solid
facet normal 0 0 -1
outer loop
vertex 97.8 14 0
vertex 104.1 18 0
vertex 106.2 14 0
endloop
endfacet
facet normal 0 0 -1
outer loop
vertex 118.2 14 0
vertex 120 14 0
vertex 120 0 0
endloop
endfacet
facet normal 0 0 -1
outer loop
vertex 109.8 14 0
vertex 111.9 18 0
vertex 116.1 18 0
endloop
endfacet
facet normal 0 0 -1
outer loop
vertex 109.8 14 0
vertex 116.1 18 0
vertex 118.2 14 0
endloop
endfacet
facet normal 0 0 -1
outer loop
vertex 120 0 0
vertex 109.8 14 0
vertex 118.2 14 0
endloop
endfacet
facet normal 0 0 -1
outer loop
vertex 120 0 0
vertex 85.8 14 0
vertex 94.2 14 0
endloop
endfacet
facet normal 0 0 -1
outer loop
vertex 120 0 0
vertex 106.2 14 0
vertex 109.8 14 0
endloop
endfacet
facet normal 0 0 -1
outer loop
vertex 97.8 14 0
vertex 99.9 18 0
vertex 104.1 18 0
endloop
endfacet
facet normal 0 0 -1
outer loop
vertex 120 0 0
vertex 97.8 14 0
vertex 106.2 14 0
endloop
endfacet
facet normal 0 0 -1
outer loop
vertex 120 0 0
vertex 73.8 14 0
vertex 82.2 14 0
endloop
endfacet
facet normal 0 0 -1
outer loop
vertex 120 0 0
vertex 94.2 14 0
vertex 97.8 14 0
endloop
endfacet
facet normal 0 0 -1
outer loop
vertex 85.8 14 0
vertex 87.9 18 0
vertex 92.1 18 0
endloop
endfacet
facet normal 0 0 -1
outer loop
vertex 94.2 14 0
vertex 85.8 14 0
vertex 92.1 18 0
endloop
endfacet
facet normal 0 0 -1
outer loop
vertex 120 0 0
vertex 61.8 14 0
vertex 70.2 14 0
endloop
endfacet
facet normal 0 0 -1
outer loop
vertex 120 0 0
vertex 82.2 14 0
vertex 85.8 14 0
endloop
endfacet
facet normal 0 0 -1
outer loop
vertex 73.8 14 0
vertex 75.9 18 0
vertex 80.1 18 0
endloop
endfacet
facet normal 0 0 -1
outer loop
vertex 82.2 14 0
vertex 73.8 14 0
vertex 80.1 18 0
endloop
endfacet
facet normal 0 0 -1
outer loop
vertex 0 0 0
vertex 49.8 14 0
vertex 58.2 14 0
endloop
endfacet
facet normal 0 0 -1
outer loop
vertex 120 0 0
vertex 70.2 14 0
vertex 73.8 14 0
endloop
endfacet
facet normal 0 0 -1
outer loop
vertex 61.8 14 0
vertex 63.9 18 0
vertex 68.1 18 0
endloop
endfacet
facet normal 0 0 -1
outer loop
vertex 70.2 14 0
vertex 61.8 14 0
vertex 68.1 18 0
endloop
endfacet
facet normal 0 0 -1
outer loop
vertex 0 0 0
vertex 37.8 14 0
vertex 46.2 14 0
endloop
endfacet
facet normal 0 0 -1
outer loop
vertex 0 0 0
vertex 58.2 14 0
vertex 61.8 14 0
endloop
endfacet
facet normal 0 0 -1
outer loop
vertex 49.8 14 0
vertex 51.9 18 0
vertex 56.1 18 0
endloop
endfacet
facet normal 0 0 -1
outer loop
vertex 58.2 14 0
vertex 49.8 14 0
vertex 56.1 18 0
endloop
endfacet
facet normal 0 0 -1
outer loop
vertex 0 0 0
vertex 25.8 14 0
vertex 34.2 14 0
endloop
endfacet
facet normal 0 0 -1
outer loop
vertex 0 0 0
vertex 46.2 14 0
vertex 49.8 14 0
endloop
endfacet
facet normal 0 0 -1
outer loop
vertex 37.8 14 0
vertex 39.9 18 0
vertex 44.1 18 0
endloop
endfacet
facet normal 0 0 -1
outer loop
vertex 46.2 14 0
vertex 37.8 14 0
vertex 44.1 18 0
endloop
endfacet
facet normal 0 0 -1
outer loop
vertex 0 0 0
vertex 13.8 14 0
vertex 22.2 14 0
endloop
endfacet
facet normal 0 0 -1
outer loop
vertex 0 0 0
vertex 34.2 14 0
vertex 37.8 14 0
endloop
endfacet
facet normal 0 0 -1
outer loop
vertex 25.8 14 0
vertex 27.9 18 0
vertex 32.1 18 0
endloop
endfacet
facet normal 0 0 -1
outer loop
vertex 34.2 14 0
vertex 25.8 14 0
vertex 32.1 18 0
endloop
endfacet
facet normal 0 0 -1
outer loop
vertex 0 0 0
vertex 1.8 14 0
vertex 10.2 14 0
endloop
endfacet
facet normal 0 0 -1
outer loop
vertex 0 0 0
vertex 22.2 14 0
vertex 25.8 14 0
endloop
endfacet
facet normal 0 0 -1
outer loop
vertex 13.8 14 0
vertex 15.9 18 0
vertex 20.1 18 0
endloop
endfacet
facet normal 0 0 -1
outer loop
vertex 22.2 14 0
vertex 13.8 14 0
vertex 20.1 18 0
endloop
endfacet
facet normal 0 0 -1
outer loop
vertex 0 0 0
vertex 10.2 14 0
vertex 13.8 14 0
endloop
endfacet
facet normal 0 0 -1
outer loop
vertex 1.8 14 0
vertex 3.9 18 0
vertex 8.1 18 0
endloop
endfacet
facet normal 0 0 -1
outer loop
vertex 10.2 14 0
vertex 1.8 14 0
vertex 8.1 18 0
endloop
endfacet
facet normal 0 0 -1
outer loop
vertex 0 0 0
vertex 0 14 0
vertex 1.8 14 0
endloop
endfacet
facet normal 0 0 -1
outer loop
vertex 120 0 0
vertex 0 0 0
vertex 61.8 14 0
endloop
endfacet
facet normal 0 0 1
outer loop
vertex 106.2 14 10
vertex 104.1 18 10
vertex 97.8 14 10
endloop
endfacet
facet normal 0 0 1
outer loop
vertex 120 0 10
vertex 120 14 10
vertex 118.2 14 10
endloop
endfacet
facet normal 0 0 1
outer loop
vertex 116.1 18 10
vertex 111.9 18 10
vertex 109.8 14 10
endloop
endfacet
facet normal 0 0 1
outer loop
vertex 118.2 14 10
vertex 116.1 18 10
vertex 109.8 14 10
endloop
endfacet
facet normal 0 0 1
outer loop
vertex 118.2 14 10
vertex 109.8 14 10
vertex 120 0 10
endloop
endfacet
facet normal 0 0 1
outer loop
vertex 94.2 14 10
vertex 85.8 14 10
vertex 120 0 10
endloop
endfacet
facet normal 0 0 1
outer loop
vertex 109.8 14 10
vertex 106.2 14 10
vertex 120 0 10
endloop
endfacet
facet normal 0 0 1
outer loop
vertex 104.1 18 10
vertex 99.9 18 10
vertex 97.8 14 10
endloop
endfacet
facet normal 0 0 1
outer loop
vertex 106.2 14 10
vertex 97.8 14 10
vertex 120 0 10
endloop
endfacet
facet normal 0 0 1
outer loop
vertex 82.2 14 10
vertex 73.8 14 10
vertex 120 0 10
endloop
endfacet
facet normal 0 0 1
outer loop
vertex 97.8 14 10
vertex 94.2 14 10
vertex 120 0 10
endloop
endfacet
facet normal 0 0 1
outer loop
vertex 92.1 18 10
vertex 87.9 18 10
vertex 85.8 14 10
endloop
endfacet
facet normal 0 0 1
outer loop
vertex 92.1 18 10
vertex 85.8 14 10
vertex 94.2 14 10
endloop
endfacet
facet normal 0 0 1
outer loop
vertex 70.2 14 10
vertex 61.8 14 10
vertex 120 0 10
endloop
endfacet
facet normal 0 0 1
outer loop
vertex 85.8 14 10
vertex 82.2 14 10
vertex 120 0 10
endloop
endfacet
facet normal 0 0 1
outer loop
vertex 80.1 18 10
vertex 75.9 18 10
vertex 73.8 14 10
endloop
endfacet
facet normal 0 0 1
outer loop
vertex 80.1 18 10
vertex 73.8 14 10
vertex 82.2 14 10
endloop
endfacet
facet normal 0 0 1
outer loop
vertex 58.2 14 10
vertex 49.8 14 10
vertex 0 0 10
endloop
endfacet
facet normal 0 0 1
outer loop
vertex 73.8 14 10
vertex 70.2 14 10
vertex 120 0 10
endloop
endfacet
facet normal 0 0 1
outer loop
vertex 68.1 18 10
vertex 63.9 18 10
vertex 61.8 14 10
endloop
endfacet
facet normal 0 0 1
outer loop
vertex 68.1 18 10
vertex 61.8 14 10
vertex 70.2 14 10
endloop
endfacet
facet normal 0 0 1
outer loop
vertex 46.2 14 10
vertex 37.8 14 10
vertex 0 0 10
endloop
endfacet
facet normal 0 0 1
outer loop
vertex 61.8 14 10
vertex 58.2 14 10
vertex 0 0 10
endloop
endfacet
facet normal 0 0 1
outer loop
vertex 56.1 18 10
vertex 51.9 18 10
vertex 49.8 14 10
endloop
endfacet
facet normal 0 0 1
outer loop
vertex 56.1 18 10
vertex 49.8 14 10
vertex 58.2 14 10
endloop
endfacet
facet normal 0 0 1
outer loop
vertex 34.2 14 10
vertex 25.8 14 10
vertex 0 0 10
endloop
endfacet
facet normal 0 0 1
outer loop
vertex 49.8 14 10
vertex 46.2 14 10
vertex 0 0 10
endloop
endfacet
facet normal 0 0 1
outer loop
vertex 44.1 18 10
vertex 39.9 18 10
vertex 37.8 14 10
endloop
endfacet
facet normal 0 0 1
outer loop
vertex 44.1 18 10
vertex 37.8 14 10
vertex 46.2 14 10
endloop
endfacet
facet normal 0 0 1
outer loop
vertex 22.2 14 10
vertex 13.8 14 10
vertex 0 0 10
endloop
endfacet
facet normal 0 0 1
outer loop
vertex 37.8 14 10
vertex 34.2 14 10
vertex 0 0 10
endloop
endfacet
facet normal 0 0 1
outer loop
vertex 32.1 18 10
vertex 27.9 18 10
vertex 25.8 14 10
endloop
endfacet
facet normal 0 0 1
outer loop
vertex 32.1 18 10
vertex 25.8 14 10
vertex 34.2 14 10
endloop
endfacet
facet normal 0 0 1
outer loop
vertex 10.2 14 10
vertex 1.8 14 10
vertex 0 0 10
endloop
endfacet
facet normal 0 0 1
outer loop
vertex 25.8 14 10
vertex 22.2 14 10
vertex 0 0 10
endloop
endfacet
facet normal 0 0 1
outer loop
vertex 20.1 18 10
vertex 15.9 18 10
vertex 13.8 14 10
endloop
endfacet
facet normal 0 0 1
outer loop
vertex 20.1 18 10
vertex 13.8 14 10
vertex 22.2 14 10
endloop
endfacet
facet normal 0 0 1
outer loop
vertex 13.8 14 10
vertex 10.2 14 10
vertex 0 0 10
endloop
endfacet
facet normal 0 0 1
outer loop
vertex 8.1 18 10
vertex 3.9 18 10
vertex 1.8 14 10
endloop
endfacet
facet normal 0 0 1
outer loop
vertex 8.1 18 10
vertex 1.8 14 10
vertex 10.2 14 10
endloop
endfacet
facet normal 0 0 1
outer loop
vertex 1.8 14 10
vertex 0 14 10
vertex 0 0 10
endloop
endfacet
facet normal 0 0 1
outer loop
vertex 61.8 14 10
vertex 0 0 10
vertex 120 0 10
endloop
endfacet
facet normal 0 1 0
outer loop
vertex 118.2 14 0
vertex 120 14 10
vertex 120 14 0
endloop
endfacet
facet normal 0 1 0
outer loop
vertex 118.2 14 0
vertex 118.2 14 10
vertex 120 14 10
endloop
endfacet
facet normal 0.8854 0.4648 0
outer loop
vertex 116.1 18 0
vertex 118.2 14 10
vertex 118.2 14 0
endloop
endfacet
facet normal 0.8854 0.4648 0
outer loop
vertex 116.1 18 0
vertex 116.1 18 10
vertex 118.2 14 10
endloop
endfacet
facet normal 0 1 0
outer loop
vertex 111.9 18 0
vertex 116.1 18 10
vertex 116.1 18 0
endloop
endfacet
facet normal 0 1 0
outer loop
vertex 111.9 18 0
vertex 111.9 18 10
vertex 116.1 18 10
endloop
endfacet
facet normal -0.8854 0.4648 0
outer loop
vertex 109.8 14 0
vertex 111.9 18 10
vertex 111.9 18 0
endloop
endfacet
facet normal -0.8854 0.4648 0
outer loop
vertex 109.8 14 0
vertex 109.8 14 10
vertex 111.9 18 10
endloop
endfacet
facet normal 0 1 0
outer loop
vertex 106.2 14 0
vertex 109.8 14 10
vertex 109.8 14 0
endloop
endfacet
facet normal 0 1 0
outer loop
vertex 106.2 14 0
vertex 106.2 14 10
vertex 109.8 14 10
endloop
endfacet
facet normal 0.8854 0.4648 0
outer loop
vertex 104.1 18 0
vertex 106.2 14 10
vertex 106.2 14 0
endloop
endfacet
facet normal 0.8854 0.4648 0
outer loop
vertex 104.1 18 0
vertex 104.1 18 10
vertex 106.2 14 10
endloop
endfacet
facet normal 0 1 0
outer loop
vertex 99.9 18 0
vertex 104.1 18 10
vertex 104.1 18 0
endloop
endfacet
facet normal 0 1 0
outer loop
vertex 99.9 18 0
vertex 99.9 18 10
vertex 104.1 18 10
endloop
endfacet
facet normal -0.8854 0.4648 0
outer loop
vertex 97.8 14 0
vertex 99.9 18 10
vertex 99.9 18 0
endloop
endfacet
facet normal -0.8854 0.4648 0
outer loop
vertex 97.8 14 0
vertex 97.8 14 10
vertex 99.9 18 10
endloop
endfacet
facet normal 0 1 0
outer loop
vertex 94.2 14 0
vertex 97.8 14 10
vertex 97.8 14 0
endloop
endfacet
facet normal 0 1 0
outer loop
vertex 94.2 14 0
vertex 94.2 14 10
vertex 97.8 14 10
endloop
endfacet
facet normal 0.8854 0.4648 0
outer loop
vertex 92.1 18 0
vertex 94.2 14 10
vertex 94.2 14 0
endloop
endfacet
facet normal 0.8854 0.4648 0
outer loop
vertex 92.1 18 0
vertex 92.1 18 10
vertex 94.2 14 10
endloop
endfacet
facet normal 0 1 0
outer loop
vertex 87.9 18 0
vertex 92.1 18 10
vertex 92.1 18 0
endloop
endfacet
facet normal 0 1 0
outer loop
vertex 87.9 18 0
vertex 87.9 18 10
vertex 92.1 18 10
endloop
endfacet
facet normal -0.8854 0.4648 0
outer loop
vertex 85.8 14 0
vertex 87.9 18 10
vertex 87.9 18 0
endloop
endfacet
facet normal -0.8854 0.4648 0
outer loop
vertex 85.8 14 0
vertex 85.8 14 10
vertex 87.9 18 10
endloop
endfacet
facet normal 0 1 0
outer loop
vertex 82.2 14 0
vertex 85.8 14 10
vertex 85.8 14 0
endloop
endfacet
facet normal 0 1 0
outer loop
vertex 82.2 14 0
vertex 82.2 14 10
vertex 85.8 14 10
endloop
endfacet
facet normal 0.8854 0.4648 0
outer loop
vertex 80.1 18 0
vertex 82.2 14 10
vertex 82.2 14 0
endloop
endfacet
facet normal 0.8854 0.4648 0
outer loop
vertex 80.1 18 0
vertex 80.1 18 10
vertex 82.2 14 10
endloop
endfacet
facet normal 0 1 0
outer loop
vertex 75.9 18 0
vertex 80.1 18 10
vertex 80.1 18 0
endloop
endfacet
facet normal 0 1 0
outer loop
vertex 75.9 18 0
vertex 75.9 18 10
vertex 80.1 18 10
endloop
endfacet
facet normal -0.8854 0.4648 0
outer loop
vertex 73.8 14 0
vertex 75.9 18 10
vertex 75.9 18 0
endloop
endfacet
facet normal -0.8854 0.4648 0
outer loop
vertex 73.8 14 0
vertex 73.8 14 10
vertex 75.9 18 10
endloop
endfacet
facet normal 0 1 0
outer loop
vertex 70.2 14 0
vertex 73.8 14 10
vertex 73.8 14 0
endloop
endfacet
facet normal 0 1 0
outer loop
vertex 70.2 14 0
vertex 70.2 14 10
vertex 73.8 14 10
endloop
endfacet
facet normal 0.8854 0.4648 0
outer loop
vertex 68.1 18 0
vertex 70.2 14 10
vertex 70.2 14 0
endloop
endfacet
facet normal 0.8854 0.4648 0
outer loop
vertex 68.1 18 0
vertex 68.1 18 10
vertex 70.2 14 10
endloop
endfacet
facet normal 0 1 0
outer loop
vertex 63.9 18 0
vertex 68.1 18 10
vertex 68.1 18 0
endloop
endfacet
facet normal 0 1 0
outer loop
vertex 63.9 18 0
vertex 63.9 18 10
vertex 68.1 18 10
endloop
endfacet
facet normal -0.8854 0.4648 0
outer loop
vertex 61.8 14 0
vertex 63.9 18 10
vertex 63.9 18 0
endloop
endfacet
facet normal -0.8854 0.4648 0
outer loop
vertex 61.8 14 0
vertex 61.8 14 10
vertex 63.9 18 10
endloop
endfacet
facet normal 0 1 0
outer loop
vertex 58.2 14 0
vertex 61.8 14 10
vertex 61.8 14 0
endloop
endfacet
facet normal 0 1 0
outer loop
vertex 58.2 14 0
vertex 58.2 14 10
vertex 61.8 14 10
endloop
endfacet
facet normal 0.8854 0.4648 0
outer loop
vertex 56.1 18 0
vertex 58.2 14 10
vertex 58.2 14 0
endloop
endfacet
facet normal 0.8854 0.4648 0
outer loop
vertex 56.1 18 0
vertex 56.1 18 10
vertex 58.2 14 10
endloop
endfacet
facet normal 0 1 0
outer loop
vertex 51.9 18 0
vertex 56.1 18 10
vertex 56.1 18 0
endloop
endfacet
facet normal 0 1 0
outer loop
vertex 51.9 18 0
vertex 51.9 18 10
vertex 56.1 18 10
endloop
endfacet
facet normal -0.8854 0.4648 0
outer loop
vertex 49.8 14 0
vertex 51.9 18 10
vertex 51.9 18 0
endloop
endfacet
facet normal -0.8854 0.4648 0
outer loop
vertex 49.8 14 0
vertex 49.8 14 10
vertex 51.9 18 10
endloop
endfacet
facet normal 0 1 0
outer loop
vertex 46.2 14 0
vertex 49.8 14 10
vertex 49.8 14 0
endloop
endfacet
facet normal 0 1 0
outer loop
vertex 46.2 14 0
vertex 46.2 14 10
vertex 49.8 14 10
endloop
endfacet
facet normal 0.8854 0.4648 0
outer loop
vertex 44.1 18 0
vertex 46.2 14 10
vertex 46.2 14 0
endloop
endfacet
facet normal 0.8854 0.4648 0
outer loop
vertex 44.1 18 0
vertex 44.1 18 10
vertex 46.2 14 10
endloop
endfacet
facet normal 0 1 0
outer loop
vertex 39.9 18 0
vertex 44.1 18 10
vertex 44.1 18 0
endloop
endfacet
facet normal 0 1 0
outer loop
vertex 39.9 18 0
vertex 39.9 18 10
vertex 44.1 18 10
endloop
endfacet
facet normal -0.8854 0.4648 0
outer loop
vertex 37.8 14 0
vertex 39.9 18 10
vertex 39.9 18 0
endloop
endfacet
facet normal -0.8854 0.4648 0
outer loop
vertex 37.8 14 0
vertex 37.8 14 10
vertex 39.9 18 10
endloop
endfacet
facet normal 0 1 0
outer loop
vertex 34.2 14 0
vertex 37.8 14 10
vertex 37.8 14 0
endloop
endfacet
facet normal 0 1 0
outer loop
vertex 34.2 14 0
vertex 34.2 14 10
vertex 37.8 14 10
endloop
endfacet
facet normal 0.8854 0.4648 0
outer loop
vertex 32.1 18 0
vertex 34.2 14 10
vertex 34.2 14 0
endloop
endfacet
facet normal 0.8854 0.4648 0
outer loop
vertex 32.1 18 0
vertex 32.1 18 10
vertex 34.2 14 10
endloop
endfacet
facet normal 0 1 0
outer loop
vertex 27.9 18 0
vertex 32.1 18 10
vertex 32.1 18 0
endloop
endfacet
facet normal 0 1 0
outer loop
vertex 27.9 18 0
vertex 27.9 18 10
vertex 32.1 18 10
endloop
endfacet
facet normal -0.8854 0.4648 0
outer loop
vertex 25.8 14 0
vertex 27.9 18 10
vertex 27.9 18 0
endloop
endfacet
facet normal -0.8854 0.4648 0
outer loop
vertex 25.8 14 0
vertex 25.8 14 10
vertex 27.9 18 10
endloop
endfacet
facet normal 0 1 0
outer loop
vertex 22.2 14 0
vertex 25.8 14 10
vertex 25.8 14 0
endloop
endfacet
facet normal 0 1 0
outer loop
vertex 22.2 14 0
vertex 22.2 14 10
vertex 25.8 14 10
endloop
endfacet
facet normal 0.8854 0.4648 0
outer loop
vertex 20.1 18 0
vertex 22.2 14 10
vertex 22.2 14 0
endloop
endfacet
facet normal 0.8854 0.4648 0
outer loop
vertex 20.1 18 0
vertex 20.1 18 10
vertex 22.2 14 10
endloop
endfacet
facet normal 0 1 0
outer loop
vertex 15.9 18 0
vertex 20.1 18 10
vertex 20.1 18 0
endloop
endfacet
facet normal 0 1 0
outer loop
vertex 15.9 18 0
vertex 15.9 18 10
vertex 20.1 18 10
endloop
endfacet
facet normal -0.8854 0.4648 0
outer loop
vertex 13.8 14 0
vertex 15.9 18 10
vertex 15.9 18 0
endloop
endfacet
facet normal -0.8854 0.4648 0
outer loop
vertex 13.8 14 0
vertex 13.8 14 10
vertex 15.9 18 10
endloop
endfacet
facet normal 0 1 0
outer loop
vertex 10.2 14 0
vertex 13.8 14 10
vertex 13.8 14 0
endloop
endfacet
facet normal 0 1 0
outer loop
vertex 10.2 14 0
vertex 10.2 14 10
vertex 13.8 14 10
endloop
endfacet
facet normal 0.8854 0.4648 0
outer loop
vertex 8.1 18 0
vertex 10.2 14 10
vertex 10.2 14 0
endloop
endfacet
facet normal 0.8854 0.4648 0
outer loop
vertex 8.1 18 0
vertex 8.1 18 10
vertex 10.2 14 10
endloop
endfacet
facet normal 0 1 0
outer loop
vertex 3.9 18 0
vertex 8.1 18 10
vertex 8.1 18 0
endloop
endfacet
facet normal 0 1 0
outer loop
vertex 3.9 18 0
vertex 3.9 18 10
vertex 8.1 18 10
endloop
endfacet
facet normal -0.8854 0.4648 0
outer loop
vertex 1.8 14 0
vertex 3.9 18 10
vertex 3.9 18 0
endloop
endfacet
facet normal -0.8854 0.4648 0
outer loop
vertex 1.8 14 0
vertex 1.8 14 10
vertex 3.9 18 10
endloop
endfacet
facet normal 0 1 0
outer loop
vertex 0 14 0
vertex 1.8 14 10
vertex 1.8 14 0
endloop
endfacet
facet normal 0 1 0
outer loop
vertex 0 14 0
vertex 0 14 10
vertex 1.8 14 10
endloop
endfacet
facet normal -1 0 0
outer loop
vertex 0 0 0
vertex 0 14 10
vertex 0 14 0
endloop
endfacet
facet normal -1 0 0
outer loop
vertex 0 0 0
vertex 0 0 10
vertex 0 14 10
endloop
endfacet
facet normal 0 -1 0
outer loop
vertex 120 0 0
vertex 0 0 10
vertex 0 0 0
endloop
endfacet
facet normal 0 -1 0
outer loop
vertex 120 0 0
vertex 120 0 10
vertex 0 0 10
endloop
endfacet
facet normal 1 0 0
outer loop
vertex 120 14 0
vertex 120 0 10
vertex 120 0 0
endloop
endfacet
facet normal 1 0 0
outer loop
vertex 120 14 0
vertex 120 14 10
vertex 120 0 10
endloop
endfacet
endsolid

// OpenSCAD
$fn = 32;

// ----------------------------------------------------------------------
// Gear rack: 10 teeth, pitch 12 mm
// ----------------------------------------------------------------------

// --- parameters (mm) ---
teeth = 10;               // number of teeth
pitch = 12;               // tooth pitch, X
root_w = 8.4;             // tooth width at the root
tip_w = 4.2;              // tooth width at the tip
base_h = 14;              // rack body height, Y
tooth_h = 4;              // tooth height above the body
plate_t = 10;             // rack width, Z (extrusion height)
fit_tol = 0.02;           // declared fit tolerance (prompt contract)
free_tol = 0.2;           // declared free tolerance (prompt contract)

rack_l = teeth * pitch;  // overall length
total_h = base_h + tooth_h;  // overall height

profile = [[0, 0], [120, 0], [120, 14], [118.2, 14], [116.1, 18], [111.9, 18], [109.8, 14], [106.2, 14], [104.1, 18], [99.9, 18], [97.8, 14], [94.2, 14], [92.1, 18], [87.9, 18], [85.8, 14], [82.2, 14], [80.1, 18], [75.9, 18], [73.8, 14], [70.2, 14], [68.1, 18], [63.9, 18], [61.8, 14], [58.2, 14], [56.1, 18], [51.9, 18], [49.8, 14], [46.2, 14], [44.1, 18], [39.9, 18], [37.8, 14], [34.2, 14], [32.1, 18], [27.9, 18], [25.8, 14], [22.2, 14], [20.1, 18], [15.9, 18], [13.8, 14], [10.2, 14], [8.1, 18], [3.9, 18], [1.8, 14], [0, 14]];  // primary outline, 44 points, counter clockwise

// --- the one profile operation ---
linear_extrude(height = plate_t) polygon(points = profile);
